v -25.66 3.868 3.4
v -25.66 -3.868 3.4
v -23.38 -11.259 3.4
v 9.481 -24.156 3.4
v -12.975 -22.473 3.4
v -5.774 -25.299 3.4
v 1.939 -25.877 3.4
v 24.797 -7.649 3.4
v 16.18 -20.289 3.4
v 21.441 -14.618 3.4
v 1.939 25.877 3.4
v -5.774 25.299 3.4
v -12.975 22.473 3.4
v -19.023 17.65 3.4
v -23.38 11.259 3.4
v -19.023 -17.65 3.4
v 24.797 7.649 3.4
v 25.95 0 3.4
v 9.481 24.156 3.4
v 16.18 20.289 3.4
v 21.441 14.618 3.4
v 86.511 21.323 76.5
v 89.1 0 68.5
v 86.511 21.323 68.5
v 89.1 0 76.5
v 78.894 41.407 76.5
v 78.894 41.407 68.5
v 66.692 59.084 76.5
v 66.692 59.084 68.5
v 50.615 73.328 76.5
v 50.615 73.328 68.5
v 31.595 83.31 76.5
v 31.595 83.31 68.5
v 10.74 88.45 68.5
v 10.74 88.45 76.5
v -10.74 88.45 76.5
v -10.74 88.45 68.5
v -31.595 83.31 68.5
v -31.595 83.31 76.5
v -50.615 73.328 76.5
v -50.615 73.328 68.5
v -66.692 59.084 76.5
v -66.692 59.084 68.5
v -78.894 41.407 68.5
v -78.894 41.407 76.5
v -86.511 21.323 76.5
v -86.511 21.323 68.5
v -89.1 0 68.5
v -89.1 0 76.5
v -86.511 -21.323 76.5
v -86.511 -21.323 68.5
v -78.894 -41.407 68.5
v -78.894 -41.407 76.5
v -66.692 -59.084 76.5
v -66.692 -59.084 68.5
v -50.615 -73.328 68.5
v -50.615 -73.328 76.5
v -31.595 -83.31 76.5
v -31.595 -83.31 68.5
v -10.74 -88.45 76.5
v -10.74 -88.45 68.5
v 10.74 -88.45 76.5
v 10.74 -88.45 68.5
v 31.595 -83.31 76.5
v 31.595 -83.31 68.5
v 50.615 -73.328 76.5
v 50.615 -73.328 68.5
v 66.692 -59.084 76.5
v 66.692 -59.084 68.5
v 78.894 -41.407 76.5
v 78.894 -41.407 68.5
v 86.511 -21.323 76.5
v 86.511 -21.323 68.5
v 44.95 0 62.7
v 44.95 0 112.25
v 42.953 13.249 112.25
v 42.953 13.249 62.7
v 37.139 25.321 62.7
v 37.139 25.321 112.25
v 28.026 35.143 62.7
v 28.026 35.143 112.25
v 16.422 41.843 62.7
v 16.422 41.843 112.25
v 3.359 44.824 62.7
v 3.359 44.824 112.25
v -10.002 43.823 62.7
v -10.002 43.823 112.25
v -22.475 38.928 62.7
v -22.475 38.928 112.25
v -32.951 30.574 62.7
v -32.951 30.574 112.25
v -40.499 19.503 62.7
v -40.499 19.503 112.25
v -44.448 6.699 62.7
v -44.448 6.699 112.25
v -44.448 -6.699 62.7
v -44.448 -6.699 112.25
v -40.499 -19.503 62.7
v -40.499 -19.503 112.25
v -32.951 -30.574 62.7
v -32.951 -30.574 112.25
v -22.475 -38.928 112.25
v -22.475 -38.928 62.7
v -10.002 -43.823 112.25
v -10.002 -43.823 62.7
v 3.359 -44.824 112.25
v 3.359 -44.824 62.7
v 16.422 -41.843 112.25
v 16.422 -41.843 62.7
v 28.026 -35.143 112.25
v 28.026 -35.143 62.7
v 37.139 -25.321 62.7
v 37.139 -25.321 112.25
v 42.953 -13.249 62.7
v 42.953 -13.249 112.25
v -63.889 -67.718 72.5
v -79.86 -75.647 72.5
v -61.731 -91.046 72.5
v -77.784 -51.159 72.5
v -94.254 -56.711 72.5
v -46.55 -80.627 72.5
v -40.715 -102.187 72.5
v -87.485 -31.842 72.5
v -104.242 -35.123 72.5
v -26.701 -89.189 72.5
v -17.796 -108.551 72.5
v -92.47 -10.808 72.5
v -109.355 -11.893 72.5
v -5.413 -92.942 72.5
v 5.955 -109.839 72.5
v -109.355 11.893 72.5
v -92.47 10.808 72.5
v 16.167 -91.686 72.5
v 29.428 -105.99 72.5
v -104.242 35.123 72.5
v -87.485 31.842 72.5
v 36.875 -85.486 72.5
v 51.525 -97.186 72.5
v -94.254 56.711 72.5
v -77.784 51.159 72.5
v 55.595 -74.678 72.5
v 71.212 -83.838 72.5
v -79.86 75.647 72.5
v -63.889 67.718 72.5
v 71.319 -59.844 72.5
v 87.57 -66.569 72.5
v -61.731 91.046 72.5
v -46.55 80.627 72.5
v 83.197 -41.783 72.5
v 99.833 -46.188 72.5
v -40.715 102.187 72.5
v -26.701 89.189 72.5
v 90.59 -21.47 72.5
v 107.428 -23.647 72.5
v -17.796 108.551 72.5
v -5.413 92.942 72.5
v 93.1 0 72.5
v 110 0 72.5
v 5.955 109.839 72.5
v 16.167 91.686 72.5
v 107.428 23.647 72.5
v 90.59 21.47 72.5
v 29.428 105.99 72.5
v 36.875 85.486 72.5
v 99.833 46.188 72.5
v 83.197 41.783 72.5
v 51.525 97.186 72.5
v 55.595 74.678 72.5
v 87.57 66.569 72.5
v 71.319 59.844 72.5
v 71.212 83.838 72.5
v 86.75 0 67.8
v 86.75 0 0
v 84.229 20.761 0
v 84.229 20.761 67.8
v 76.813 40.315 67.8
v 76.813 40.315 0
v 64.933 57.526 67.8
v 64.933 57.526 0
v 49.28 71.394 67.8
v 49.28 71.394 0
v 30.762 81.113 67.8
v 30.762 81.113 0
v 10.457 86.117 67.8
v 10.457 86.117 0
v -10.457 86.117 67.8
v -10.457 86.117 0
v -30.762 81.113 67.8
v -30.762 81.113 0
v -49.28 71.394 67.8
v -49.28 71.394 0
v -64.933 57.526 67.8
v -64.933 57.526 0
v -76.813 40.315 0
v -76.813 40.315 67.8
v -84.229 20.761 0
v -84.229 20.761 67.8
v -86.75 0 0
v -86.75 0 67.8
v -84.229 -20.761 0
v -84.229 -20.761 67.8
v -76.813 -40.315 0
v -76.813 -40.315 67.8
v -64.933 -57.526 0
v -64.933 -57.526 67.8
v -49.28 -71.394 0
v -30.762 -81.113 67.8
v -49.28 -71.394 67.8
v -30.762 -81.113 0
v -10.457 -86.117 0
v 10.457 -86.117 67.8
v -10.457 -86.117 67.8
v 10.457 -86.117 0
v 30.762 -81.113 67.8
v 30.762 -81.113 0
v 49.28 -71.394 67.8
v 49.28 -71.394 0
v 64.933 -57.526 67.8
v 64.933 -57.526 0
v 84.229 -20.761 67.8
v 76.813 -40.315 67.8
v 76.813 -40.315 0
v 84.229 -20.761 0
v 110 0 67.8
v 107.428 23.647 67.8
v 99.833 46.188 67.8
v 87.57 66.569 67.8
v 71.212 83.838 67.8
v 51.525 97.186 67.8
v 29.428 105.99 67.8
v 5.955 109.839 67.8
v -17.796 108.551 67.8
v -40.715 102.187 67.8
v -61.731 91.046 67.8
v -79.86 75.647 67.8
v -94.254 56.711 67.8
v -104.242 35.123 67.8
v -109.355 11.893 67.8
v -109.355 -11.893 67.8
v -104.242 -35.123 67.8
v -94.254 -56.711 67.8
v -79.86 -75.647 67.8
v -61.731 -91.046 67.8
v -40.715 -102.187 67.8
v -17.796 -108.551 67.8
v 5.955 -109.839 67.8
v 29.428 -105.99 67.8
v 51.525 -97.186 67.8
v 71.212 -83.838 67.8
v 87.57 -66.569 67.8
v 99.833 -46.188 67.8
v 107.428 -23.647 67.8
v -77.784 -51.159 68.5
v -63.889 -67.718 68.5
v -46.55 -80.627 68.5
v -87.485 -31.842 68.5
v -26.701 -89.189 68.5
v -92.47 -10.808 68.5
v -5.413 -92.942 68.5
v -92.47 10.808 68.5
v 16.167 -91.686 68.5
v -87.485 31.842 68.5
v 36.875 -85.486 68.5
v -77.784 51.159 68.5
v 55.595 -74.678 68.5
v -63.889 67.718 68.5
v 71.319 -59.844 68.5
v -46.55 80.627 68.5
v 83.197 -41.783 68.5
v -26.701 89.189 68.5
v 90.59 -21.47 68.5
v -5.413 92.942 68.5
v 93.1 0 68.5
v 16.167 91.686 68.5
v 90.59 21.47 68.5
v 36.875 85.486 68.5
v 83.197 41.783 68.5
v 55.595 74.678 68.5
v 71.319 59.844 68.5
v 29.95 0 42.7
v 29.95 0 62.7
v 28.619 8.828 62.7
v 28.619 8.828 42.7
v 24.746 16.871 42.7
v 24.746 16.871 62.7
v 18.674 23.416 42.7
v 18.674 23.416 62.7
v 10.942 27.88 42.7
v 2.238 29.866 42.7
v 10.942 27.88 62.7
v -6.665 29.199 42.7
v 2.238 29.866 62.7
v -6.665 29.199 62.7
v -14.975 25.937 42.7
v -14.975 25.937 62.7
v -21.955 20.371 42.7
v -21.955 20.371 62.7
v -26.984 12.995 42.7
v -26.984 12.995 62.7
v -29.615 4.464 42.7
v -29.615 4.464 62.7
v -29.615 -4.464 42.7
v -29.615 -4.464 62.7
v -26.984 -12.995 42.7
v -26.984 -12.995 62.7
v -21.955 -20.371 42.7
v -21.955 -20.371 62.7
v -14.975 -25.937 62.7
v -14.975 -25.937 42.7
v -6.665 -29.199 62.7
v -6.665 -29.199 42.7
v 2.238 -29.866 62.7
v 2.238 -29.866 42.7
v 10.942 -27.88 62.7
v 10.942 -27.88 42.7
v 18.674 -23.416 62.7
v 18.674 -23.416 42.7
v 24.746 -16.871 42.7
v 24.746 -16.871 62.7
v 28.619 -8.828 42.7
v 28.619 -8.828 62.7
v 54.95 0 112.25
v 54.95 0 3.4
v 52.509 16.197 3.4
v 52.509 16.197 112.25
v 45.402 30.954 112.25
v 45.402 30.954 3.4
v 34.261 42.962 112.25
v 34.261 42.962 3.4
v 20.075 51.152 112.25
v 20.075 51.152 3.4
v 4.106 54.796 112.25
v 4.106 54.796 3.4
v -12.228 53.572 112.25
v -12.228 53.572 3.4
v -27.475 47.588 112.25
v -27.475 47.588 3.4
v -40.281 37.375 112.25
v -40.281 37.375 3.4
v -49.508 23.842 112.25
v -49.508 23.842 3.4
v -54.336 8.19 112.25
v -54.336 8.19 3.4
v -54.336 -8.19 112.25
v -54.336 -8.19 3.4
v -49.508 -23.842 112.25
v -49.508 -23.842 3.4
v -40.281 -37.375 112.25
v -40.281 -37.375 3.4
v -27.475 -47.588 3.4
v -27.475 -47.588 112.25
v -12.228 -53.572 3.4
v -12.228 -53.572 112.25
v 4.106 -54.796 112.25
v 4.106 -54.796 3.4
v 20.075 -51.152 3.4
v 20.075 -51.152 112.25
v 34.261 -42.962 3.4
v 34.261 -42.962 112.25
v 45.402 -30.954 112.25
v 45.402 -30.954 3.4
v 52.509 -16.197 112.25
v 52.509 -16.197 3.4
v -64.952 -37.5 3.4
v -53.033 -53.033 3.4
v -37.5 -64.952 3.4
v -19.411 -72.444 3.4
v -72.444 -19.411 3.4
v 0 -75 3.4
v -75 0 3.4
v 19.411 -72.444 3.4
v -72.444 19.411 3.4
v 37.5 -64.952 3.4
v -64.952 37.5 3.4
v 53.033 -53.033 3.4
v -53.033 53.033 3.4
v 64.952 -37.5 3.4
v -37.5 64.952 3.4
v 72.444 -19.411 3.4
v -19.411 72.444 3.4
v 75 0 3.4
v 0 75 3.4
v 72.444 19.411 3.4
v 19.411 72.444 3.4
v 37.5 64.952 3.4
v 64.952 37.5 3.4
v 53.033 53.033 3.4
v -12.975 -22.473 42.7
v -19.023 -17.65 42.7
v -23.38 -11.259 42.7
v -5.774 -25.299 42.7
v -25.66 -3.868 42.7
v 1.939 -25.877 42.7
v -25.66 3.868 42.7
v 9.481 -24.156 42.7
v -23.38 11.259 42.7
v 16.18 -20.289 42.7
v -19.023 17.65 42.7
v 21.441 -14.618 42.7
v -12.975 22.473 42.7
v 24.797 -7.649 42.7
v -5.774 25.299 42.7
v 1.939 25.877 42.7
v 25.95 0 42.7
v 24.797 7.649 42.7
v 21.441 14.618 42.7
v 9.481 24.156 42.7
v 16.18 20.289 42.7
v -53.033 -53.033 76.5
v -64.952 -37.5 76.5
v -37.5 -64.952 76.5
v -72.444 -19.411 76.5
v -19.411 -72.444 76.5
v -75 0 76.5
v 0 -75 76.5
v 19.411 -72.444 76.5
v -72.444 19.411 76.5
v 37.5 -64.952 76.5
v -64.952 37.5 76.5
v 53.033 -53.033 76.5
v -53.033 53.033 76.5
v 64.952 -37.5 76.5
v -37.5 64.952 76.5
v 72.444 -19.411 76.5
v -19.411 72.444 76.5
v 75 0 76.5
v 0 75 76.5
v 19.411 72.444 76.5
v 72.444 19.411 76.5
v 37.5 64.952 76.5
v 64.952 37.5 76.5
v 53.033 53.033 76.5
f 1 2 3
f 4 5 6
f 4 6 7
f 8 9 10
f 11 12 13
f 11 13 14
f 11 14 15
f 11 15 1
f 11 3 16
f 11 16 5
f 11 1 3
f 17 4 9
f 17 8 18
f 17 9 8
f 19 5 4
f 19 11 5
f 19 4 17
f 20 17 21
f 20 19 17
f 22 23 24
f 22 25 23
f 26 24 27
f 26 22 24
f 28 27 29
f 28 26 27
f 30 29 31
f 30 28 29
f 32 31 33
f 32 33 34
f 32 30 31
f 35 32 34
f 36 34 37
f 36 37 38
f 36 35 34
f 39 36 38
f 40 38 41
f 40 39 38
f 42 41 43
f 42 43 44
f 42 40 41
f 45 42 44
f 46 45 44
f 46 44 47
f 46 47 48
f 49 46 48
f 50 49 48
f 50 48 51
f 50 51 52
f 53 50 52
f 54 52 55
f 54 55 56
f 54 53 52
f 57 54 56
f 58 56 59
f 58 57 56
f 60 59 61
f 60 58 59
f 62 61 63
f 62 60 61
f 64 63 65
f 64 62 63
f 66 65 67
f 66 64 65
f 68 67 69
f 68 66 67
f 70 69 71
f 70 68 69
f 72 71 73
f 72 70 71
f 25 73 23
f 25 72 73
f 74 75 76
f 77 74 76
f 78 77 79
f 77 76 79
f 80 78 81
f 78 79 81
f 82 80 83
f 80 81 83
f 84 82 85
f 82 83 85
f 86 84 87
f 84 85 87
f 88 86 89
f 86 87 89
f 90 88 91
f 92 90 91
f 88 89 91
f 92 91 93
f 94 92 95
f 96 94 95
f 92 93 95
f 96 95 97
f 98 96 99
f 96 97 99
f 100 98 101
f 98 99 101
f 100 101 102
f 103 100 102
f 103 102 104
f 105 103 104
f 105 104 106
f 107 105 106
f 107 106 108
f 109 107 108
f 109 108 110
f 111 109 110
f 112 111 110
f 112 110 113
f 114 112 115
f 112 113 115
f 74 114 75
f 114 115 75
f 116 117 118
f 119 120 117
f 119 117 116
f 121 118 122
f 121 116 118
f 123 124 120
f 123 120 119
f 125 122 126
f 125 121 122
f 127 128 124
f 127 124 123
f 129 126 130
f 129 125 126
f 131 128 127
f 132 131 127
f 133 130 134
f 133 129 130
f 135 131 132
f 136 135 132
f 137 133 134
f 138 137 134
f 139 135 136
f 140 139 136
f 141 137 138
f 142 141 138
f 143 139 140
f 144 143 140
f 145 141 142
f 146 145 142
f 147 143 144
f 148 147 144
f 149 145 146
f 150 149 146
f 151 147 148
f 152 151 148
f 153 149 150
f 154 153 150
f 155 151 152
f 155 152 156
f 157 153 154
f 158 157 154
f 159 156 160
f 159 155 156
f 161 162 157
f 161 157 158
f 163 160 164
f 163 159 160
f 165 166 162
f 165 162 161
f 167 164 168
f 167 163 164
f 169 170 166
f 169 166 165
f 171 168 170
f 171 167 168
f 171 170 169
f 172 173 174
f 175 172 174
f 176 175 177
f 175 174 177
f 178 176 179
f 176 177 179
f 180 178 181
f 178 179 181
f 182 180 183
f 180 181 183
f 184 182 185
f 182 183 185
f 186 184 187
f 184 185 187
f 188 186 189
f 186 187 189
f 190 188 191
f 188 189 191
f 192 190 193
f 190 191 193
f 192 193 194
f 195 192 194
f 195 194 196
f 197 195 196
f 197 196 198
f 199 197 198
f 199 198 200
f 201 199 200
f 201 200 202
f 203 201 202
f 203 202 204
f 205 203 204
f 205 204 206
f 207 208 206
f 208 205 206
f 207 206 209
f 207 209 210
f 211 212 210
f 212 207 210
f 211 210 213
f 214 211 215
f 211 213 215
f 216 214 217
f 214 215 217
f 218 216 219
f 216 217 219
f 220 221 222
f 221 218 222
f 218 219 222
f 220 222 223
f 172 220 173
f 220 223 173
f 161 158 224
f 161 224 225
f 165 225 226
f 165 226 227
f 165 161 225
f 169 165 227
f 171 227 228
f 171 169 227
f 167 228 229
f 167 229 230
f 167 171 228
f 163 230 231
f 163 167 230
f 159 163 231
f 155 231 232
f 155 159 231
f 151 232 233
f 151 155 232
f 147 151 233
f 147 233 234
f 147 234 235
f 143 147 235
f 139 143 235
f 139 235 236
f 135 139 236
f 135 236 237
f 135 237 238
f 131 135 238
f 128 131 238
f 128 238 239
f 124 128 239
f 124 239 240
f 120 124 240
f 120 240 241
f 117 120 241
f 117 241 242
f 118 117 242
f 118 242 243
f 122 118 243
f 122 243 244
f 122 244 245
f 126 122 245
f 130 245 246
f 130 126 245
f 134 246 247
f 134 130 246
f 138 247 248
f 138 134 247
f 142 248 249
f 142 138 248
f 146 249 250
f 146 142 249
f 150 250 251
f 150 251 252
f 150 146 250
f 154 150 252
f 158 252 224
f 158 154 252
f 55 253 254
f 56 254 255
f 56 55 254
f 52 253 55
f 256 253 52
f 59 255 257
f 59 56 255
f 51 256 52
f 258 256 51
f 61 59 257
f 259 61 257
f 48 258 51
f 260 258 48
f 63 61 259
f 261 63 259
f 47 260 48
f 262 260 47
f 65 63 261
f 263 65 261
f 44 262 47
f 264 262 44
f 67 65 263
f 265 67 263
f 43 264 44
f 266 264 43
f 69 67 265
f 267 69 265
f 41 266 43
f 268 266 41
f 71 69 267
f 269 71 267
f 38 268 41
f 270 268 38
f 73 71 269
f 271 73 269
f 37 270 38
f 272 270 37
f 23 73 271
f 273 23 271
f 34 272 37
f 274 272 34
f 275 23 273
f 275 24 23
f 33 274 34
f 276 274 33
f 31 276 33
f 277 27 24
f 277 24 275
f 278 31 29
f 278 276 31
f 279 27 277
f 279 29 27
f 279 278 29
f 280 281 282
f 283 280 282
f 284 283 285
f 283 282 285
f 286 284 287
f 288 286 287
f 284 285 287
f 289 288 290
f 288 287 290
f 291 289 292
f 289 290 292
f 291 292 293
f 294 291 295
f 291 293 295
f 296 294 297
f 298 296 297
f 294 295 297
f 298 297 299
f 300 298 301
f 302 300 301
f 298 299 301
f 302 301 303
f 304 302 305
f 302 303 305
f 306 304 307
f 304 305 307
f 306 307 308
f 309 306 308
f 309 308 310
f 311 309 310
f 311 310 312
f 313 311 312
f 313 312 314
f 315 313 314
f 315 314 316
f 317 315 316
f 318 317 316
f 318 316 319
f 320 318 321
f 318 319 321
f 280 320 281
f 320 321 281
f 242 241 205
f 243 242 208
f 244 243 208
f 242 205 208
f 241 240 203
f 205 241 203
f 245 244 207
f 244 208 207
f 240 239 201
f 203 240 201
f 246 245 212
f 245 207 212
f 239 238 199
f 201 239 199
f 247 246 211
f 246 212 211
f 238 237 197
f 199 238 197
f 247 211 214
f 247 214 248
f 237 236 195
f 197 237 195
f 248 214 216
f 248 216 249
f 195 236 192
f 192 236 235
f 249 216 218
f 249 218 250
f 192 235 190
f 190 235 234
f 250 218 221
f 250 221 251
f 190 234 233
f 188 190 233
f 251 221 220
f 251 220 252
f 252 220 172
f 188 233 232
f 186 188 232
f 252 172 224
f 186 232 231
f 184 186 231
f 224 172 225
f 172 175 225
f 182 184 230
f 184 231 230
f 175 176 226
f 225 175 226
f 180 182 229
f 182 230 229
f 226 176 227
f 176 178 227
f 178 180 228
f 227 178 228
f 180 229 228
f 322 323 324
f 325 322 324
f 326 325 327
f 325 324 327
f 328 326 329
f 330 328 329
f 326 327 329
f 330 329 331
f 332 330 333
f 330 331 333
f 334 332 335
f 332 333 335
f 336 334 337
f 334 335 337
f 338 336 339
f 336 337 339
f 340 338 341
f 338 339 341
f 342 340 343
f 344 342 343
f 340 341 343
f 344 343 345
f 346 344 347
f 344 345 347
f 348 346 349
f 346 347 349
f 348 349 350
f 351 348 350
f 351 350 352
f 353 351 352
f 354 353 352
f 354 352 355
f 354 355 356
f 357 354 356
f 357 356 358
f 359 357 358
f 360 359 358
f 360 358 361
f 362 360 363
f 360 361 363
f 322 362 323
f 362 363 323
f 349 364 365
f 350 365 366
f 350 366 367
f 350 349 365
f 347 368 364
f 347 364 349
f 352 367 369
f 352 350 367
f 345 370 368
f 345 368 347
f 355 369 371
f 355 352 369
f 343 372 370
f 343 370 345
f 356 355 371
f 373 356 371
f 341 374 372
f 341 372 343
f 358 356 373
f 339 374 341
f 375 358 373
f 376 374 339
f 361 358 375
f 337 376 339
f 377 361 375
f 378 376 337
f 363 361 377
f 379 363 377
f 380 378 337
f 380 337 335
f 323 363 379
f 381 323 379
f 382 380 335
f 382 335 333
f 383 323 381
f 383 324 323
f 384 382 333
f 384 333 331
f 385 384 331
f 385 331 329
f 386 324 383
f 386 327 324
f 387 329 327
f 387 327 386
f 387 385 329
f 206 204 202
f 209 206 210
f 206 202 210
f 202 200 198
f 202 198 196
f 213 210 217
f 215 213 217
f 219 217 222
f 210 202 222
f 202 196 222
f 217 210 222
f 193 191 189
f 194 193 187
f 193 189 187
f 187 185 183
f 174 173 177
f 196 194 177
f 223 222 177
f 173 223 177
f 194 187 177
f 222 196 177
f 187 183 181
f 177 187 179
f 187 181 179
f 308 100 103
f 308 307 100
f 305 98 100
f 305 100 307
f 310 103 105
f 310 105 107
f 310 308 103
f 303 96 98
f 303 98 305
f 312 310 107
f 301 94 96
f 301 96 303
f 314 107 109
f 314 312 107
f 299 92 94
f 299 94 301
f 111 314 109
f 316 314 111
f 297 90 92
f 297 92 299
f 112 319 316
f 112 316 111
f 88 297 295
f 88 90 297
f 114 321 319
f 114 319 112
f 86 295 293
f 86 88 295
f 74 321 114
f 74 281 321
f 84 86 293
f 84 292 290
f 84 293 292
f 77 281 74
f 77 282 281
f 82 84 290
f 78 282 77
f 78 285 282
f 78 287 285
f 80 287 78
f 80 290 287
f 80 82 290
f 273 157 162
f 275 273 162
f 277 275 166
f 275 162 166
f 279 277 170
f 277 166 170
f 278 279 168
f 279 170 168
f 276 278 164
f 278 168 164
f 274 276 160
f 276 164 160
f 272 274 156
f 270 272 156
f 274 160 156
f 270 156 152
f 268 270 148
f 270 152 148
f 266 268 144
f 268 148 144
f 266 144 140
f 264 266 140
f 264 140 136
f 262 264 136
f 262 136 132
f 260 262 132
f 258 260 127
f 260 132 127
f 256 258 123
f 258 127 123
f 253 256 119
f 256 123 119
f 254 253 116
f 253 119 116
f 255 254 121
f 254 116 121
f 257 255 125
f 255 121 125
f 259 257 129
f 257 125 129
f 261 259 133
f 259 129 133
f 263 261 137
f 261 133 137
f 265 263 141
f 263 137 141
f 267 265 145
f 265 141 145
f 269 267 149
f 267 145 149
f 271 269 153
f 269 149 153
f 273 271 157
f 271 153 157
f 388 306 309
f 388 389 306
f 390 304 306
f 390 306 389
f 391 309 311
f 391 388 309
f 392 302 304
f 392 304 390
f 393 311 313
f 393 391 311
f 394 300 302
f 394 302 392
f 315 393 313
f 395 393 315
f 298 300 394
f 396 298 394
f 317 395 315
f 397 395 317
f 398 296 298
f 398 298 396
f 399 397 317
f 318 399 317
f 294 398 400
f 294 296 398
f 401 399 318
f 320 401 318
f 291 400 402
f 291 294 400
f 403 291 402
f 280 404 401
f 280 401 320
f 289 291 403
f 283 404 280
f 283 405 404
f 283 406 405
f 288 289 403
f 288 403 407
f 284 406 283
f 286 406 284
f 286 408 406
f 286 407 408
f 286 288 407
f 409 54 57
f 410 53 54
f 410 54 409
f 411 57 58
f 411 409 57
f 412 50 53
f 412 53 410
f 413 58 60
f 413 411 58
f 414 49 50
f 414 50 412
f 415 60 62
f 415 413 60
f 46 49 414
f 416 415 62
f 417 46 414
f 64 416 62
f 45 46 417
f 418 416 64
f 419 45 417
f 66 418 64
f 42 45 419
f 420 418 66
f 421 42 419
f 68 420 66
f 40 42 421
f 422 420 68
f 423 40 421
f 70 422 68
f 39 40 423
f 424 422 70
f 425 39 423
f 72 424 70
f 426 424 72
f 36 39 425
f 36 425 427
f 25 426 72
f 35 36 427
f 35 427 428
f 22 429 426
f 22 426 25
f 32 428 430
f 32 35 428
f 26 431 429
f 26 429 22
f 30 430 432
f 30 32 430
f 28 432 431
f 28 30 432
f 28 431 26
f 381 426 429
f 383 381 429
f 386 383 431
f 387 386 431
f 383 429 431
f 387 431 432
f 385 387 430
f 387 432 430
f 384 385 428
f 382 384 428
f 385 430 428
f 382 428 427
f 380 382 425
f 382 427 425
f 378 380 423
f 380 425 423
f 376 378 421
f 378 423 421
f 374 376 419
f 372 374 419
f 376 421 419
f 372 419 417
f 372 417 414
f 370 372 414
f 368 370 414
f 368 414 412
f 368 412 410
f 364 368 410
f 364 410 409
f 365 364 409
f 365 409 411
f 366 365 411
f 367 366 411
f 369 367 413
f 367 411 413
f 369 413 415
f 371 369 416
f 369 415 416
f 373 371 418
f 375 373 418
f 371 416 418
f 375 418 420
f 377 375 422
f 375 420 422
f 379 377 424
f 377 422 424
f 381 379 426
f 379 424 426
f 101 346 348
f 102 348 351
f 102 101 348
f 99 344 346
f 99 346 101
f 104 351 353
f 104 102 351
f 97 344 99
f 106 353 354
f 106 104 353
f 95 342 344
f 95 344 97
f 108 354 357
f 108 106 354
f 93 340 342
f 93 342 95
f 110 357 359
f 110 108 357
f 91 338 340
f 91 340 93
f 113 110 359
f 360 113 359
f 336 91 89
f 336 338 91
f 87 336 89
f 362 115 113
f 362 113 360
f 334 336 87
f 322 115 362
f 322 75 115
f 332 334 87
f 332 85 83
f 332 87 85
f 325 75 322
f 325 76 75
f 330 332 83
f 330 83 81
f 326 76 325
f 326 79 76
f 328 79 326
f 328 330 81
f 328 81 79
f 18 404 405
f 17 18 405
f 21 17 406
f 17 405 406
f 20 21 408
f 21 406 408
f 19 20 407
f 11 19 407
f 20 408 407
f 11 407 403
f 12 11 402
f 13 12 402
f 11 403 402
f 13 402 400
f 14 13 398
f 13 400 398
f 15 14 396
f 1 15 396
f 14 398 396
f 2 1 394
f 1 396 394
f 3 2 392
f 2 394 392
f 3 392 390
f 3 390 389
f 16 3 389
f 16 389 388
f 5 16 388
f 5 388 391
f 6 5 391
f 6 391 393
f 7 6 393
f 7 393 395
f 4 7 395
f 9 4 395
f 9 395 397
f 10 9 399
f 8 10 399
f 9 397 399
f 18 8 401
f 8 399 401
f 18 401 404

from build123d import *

# Parameters (mm, degrees)
F0_R      = 86.75
F1_DEPTH  = 76.5
F2_R      = 110
F3_DEPTH  = 8.7
F4_R      = 110
F4_R_2    = 93.1
F4_R_3    = 89.1
F5_DEPTH  = 4
F6_R      = 93.1
F6_R_2    = 89.1
F7_DEPTH  = 4
F8_R      = 75
F9_DEPTH  = 73.1
F10_R     = 54.95
F11_DEPTH = 108.85
F12_R     = 44.95
F13_DEPTH = 49.55
F14_R     = 29.95
F15_DEPTH = 20
F16_R     = 25.95
F17_DEPTH = 39.3


with BuildPart() as f1:
    # F0 (on Top) → F1 (new body)
    with BuildSketch(Plane.XY):
        Circle(F0_R)
    extrude(amount=F1_DEPTH)

    # F2 (on face) → F3 (join)
    with BuildSketch(Plane.XY.offset(76.5)):
        Circle(F2_R)
    extrude(amount=-F3_DEPTH)

    # F4 (on face) → F5 (cut)
    with BuildSketch(Plane.XY.offset(76.5)):
        Circle(F4_R)
        Circle(F4_R_2, mode=Mode.SUBTRACT)
        Circle(F4_R_2)
        Circle(F4_R_3, mode=Mode.SUBTRACT)
    extrude(amount=-F5_DEPTH, mode=Mode.SUBTRACT)

    # F6 (on face) → F7 (cut)
    with BuildSketch(Plane.XY.offset(72.5)):
        Circle(F6_R)
        Circle(F6_R_2, mode=Mode.SUBTRACT)
    extrude(amount=-F7_DEPTH, mode=Mode.SUBTRACT)

    # F8 (on face) → F9 (cut)
    with BuildSketch(Plane.XY.offset(76.5)):
        Circle(F8_R)
    extrude(amount=-F9_DEPTH, mode=Mode.SUBTRACT)

    # F10 (on face) → F11 (join)
    with BuildSketch(Plane.XY.offset(3.4)):
        Circle(F10_R)
    extrude(amount=F11_DEPTH)

    # F12 (on face) → F13 (cut)
    with BuildSketch(Plane.XY.offset(112.25)):
        Circle(F12_R)
    extrude(amount=-F13_DEPTH, mode=Mode.SUBTRACT)

    # F14 (on face) → F15 (cut)
    with BuildSketch(Plane.XY.offset(62.7)):
        Circle(F14_R)
    extrude(amount=-F15_DEPTH, mode=Mode.SUBTRACT)

    # F16 (on face) → F17 (cut)
    with BuildSketch(Plane.XY.offset(42.7)):
        Circle(F16_R)
    extrude(amount=-F17_DEPTH, mode=Mode.SUBTRACT)


solid = f1.part
